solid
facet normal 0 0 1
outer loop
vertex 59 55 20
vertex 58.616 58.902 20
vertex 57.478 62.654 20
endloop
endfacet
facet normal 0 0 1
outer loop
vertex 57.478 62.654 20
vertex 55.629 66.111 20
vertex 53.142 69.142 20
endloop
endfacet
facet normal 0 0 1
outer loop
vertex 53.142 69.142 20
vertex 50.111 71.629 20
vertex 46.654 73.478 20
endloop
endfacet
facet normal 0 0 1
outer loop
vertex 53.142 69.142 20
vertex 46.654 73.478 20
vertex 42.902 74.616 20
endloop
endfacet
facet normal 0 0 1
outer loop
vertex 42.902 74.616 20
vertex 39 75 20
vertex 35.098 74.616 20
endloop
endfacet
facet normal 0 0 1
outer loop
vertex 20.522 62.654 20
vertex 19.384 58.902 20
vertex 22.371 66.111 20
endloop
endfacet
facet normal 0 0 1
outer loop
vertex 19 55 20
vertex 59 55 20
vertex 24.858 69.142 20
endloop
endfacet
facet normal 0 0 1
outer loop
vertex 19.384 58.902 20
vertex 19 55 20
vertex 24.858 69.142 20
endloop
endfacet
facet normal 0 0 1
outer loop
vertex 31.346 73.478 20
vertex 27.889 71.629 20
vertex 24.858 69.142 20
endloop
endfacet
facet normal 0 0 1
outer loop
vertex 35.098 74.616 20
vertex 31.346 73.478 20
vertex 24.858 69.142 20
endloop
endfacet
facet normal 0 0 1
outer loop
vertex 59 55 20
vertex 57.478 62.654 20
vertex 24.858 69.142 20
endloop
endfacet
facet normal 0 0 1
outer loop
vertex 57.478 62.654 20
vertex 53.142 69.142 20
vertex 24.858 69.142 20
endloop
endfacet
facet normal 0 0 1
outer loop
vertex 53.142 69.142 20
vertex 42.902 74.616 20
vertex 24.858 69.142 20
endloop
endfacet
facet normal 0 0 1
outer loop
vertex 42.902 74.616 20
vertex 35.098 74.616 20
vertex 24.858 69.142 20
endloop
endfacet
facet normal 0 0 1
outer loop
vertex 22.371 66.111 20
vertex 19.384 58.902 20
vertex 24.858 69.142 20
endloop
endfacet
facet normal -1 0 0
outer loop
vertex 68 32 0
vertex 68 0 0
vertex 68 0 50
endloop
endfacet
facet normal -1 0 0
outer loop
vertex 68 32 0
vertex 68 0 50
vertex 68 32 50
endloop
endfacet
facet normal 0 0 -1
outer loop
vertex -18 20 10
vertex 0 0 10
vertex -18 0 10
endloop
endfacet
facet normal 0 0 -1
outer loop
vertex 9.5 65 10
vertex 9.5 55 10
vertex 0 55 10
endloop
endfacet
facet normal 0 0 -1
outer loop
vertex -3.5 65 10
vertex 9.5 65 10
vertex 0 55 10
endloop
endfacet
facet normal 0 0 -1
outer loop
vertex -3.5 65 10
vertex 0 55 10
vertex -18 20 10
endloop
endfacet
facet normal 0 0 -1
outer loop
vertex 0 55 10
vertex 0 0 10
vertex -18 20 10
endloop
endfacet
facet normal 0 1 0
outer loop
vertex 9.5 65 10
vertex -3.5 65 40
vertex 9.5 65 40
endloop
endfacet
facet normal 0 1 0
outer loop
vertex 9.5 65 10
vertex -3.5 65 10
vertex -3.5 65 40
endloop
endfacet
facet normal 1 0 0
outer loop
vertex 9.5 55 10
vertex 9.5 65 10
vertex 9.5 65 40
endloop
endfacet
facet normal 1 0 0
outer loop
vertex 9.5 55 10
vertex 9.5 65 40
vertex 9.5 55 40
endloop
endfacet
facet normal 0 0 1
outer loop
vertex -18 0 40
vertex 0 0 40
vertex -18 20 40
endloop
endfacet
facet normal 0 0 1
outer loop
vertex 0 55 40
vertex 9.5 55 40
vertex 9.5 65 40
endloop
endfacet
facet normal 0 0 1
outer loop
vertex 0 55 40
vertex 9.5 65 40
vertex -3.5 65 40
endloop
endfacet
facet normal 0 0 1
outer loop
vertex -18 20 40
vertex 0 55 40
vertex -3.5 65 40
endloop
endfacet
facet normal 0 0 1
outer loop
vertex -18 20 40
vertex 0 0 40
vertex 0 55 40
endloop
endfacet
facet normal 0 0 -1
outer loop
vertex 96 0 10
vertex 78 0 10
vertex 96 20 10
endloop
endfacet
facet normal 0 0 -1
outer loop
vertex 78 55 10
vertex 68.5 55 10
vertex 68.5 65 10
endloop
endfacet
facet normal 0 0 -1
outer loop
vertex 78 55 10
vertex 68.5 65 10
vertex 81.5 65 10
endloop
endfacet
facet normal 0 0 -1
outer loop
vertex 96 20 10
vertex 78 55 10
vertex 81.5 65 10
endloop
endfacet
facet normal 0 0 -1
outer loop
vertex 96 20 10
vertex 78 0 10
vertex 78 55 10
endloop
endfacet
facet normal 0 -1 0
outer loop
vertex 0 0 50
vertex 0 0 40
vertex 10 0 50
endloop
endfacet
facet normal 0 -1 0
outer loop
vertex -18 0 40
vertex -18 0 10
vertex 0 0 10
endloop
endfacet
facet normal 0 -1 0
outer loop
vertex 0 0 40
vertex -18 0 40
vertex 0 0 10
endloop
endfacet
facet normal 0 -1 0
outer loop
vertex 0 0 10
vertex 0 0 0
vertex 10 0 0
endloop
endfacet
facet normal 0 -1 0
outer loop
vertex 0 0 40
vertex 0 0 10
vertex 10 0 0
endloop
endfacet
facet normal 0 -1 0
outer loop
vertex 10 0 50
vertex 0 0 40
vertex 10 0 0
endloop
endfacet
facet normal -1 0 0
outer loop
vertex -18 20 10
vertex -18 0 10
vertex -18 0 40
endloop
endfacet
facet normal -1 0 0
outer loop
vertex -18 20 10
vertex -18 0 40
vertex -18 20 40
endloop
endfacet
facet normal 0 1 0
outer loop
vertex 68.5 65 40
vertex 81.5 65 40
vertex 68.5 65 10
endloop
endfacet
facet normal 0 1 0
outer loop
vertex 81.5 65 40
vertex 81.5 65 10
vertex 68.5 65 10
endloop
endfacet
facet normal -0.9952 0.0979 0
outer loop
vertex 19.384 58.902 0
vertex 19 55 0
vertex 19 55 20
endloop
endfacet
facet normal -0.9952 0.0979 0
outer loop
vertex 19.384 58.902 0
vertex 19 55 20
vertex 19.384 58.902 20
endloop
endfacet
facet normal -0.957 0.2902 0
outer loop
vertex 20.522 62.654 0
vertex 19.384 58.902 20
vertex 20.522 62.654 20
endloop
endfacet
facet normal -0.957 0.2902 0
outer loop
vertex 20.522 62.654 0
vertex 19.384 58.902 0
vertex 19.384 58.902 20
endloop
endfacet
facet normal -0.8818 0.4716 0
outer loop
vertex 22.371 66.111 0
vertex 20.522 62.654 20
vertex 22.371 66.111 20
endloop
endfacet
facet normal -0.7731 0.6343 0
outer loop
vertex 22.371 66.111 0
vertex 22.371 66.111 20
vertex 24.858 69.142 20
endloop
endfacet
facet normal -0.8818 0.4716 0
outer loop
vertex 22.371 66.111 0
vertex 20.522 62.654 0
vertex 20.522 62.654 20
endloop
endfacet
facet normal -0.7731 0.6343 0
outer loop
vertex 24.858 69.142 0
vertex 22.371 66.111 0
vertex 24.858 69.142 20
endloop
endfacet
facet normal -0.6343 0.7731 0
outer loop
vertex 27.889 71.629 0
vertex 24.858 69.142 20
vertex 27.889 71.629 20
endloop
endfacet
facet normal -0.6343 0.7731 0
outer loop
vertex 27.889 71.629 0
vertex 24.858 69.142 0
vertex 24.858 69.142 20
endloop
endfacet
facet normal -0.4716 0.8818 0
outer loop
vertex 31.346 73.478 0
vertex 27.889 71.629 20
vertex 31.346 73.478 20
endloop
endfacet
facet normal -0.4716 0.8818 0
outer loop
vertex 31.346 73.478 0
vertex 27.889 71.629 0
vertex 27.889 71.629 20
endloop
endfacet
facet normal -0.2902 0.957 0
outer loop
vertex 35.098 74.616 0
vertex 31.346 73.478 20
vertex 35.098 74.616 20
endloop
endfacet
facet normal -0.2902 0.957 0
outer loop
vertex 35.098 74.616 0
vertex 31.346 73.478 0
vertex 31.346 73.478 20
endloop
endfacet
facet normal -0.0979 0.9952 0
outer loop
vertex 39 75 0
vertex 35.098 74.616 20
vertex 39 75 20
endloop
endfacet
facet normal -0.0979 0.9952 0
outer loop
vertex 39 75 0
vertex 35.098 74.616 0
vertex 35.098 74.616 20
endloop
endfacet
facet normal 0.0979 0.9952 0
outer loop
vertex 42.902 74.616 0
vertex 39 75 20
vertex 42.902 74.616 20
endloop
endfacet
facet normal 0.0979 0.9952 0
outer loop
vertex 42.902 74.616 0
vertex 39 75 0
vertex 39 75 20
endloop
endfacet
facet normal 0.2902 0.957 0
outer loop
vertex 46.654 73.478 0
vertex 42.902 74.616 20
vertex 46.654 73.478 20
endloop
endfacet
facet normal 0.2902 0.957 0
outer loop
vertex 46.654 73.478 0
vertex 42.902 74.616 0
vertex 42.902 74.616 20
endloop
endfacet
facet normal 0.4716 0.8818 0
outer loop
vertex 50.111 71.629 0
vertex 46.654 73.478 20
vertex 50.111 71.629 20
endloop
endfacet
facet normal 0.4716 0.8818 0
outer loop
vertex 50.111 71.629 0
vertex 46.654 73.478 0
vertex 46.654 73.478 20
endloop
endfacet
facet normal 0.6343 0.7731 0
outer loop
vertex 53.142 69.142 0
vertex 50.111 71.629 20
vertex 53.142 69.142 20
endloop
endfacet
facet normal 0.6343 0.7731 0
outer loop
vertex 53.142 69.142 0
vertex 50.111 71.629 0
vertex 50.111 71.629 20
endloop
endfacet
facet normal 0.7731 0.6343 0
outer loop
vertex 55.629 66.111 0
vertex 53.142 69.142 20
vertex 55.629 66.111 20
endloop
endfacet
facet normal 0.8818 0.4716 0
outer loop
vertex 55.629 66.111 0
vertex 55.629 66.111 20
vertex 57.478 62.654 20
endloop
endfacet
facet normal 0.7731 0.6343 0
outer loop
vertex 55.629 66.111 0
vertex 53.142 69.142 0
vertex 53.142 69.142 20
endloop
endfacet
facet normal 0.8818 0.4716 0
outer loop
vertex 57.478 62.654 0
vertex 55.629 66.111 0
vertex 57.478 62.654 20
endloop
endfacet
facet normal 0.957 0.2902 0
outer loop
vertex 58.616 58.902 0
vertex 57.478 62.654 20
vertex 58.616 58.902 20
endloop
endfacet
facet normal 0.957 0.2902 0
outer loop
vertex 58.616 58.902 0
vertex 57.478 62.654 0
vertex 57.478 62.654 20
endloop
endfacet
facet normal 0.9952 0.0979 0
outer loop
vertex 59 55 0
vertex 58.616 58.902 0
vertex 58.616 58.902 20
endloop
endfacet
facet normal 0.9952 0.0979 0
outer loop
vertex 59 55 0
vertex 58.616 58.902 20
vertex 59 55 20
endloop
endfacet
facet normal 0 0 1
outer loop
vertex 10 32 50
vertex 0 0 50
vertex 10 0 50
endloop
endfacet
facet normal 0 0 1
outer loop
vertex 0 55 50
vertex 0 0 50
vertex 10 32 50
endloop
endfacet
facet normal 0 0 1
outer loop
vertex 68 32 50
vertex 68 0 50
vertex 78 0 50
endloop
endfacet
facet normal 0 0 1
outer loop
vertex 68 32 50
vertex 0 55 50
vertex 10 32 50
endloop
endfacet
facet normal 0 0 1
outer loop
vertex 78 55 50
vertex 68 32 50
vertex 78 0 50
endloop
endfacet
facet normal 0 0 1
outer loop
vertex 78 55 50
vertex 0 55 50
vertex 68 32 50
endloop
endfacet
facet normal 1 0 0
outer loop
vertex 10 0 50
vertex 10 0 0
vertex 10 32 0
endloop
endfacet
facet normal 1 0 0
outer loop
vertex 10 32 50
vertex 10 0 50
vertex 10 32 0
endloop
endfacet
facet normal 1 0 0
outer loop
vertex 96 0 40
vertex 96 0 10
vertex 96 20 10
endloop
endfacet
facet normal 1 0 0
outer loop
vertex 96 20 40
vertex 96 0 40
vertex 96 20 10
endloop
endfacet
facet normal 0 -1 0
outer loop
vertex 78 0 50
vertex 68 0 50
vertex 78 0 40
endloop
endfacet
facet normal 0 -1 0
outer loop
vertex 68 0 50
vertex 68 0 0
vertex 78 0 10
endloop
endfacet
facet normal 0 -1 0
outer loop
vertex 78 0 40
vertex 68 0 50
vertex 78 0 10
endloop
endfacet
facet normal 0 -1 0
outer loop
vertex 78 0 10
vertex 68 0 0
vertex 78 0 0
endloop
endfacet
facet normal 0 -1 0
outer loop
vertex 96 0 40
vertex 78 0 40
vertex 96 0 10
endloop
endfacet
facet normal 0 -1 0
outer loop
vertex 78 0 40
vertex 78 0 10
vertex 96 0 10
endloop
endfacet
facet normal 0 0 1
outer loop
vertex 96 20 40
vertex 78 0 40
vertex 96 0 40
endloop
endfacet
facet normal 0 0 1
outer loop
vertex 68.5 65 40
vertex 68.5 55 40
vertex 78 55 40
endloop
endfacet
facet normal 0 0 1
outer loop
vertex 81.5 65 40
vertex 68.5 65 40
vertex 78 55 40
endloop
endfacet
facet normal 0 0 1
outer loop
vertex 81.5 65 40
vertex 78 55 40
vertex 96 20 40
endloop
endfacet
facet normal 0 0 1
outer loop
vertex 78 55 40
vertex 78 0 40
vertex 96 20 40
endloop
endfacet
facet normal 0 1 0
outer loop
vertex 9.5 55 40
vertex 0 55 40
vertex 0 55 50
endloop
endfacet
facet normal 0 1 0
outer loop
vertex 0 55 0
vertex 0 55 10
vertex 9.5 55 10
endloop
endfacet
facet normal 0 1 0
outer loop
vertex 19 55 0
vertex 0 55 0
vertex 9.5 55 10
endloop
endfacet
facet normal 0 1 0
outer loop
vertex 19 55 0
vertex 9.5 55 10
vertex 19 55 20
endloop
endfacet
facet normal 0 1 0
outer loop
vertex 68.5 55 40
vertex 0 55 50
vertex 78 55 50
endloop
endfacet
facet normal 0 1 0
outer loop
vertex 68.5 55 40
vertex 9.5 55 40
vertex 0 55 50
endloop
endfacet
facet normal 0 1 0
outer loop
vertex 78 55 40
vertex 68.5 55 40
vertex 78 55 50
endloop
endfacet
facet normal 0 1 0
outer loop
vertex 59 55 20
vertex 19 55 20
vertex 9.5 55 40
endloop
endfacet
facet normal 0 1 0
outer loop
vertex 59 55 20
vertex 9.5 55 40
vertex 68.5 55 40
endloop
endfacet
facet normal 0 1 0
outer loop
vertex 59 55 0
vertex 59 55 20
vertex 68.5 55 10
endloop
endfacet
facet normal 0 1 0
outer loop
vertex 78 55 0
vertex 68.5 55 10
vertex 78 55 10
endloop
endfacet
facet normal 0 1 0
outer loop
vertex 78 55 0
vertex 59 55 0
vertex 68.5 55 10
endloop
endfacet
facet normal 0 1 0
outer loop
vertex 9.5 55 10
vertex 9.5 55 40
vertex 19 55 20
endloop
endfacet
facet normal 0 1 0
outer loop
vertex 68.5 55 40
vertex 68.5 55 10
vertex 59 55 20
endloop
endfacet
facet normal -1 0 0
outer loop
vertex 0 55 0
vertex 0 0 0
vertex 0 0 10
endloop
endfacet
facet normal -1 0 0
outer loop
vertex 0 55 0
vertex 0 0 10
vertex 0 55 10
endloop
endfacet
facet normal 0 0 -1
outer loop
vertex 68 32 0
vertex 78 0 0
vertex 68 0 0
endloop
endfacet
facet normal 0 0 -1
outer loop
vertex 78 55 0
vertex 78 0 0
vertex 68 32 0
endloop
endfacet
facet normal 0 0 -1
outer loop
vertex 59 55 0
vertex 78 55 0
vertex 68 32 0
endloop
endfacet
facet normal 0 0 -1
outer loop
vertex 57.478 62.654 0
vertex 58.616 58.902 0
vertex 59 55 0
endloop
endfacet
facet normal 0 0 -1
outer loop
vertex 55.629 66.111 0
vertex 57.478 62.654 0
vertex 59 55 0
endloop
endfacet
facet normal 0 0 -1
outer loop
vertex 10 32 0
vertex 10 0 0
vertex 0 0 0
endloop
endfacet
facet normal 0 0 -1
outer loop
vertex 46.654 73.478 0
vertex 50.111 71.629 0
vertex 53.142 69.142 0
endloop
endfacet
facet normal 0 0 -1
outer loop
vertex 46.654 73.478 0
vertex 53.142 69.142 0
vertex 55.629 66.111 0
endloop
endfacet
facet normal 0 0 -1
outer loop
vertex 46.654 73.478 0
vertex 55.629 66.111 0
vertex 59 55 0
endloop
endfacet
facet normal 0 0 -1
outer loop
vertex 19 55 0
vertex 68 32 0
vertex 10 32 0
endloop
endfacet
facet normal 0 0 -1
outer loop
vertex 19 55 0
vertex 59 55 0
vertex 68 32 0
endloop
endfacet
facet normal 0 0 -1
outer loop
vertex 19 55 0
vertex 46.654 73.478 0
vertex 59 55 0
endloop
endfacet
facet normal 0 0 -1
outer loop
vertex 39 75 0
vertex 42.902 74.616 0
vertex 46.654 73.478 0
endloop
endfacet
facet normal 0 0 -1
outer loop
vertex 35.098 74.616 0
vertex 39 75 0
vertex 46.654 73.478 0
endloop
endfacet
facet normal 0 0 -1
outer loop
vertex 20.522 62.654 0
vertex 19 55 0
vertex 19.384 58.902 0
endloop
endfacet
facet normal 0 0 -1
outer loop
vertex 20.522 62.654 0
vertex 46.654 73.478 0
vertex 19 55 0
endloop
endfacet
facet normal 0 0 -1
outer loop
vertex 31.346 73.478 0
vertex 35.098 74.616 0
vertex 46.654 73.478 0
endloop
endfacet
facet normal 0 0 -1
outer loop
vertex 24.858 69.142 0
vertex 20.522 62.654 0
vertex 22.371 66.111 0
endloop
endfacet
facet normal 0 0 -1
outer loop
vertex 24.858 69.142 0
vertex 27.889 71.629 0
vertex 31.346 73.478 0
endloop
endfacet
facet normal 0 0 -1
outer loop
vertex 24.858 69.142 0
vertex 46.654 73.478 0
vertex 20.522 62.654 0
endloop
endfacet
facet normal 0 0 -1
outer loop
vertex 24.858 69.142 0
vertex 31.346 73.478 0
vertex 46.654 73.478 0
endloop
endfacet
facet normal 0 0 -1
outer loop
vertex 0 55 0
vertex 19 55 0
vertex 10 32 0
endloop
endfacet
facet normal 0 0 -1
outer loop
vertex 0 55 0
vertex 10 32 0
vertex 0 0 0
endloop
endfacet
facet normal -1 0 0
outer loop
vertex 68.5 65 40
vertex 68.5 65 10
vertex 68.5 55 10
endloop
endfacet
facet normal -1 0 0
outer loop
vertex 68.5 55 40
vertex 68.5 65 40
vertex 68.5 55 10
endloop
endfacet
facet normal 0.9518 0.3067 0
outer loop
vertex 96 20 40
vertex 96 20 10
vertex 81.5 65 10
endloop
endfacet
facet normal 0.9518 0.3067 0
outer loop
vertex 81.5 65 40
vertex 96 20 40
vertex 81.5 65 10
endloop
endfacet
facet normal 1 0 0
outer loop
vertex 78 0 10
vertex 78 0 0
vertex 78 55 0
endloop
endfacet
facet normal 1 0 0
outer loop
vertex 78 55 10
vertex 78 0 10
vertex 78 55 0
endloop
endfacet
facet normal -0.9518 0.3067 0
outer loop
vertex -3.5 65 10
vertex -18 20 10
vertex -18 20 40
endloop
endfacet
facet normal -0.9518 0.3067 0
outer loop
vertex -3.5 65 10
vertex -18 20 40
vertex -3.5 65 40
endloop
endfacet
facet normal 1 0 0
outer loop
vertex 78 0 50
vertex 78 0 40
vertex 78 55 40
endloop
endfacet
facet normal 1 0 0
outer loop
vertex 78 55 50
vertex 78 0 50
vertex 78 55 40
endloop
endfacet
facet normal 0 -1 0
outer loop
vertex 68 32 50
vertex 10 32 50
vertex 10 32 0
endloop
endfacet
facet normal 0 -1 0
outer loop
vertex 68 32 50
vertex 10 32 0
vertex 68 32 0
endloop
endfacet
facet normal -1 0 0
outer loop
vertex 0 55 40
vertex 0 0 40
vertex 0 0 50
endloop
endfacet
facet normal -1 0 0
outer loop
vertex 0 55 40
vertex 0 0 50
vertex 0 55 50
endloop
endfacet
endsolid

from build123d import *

# Parameters (mm, degrees)
SKETCH15_W           = 78
SKETCH15_H           = 55
BOSS_EXTRUDE9_DEPTH  = 50
SKETCH16_W           = 58
SKETCH16_H           = 32
CUT_EXTRUDE3_DEPTH   = 50
SKETCH17_R           = 20
BOSS_EXTRUDE10_DEPTH = 20
BOSS_EXTRUDE11_DEPTH = 15


with BuildPart() as part:
    # Sketch15 → Boss-Extrude9 (new body)
    with BuildSketch(Plane.XY):
        with Locations((39, 27.5)):
            Rectangle(SKETCH15_W, SKETCH15_H)
    extrude(amount=BOSS_EXTRUDE9_DEPTH)

    # Sketch16 → Cut-Extrude3 (cut)
    with BuildSketch(Plane.XY.offset(50)):
        with Locations((39, 16)):
            Rectangle(SKETCH16_W, SKETCH16_H)
    extrude(amount=-CUT_EXTRUDE3_DEPTH, mode=Mode.SUBTRACT)

    # Sketch17 → Boss-Extrude10 (add)
    with BuildSketch(Plane(origin=(0, 0, 0), x_dir=(-1, 0, 0), z_dir=(0, 0, -1))):
        with Locations((-39, 55)):
            Circle(SKETCH17_R)
    extrude(amount=-BOSS_EXTRUDE10_DEPTH)

    # Sketch21 → Boss-Extrude11 (add, symmetric)
    with BuildSketch(Plane(origin=(0, 0, 25), x_dir=(-1, 0, 0), z_dir=(0, 0, -1))):
        Polygon((-9.5, 0), (18, 0), (18, 20), (3.5, 65), (-9.5, 65), align=None)
    boss_extrude11 = extrude(amount=BOSS_EXTRUDE11_DEPTH, both=True)

    # Mirror4: Boss-Extrude11 across plane
    add(boss_extrude11.mirror(Plane.ZY.offset(-39)))


solid = part.part
